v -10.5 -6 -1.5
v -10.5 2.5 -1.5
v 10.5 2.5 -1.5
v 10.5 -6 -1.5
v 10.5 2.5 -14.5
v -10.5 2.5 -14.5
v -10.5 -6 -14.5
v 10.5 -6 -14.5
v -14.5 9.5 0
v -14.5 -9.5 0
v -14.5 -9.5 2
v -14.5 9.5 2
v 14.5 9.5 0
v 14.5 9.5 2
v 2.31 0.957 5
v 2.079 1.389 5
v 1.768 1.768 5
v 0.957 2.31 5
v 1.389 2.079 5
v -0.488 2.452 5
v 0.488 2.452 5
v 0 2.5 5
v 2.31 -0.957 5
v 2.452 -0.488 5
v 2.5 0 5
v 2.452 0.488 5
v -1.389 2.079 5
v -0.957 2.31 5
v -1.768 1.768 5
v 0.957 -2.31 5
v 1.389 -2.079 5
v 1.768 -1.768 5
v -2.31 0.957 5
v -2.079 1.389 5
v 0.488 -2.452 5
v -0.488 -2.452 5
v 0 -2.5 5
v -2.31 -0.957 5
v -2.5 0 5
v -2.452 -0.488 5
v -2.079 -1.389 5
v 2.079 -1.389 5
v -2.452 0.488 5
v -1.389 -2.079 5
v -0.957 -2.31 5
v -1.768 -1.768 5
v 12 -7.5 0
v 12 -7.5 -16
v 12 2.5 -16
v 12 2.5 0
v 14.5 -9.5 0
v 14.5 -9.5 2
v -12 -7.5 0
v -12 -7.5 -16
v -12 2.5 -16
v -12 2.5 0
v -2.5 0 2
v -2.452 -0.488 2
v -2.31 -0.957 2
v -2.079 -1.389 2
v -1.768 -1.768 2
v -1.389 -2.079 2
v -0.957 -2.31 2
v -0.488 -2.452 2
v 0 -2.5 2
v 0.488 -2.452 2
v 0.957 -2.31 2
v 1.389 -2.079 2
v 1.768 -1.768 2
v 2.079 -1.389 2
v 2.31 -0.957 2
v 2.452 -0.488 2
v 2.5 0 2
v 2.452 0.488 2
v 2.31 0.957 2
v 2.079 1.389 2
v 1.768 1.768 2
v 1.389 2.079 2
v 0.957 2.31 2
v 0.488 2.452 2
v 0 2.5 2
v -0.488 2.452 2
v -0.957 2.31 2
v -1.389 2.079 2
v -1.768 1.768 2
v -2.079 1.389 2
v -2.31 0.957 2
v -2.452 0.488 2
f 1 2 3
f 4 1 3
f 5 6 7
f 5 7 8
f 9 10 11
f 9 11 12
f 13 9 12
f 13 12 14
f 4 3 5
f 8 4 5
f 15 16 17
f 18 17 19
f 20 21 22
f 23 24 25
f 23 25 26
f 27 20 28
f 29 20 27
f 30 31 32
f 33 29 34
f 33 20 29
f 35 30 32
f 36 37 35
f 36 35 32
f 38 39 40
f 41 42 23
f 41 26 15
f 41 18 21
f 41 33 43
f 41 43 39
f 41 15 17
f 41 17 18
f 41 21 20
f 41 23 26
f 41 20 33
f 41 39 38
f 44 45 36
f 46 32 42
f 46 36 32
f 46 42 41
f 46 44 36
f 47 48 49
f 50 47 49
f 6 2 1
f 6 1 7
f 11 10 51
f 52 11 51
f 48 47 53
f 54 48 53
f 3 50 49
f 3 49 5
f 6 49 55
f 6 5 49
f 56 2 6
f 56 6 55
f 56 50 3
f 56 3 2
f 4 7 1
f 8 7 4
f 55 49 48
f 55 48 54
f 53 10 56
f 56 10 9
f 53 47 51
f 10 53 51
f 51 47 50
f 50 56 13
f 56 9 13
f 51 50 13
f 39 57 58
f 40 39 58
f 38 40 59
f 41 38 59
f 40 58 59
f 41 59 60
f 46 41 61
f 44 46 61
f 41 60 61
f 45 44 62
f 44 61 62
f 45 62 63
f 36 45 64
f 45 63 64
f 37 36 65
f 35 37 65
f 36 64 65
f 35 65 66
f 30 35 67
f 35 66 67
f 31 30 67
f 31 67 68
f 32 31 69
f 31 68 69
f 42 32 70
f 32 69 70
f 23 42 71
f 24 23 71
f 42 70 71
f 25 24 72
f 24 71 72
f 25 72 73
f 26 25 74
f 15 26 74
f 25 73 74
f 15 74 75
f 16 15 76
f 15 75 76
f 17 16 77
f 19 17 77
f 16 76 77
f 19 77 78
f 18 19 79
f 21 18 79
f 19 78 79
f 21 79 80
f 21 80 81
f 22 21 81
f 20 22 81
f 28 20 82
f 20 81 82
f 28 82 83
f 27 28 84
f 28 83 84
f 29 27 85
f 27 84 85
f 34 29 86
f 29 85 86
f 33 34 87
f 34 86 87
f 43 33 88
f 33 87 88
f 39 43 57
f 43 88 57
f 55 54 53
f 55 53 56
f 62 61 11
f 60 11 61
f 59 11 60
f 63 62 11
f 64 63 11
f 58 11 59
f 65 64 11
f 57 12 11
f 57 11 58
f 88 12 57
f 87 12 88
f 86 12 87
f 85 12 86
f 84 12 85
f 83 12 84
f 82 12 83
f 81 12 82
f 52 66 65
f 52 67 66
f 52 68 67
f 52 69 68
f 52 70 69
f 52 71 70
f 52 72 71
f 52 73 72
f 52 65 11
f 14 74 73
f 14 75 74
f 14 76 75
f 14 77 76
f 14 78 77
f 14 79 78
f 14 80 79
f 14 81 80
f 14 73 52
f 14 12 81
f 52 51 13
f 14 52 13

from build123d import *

# Parameters (mm, degrees)
SKETCH_2_W          = 29
SKETCH_2_H          = 19
EXTRUDE_1_DEPTH     = 2
SKETCH_3_W          = 24
SKETCH_3_H          = 10
EXTRUDE_2_DEPTH     = 16
SKETCH_4_W          = 21
SKETCH_4_H          = 13
CUT_EXTRUDE_1_DEPTH = 8.5
SKETCH_5_R          = 2.5
EXTRUDE_3_DEPTH     = 3


with BuildPart() as part:
    # 草图2 → 凸台-拉伸1 (new body)
    with BuildSketch(Plane.XY):
        Rectangle(SKETCH_2_W, SKETCH_2_H)
    extrude(amount=EXTRUDE_1_DEPTH)

    # 草图3 → 凸台-拉伸2 (add)
    with BuildSketch(Plane(origin=(0, 0, 0), x_dir=(-1, 0, 0), z_dir=(0, 0, -1))):
        with Locations((0, -2.5)):
            Rectangle(SKETCH_3_W, SKETCH_3_H)
    extrude(amount=EXTRUDE_2_DEPTH)

    # 草图4 → 切除-拉伸1 (cut)
    with BuildSketch(Plane(origin=(0, 2.5, 0), x_dir=(1, 0, 0), z_dir=(0, 1, 0))):
        with Locations((0, 8)):
            Rectangle(SKETCH_4_W, SKETCH_4_H)
    extrude(amount=-CUT_EXTRUDE_1_DEPTH, mode=Mode.SUBTRACT)

    # 草图5 → 凸台-拉伸3 (add)
    with BuildSketch(Plane.XY.offset(2)):
        with Locations(Location((0, 0, 0), (0, 0, 180))):
            Circle(SKETCH_5_R)
    extrude(amount=EXTRUDE_3_DEPTH)


solid = part.part
